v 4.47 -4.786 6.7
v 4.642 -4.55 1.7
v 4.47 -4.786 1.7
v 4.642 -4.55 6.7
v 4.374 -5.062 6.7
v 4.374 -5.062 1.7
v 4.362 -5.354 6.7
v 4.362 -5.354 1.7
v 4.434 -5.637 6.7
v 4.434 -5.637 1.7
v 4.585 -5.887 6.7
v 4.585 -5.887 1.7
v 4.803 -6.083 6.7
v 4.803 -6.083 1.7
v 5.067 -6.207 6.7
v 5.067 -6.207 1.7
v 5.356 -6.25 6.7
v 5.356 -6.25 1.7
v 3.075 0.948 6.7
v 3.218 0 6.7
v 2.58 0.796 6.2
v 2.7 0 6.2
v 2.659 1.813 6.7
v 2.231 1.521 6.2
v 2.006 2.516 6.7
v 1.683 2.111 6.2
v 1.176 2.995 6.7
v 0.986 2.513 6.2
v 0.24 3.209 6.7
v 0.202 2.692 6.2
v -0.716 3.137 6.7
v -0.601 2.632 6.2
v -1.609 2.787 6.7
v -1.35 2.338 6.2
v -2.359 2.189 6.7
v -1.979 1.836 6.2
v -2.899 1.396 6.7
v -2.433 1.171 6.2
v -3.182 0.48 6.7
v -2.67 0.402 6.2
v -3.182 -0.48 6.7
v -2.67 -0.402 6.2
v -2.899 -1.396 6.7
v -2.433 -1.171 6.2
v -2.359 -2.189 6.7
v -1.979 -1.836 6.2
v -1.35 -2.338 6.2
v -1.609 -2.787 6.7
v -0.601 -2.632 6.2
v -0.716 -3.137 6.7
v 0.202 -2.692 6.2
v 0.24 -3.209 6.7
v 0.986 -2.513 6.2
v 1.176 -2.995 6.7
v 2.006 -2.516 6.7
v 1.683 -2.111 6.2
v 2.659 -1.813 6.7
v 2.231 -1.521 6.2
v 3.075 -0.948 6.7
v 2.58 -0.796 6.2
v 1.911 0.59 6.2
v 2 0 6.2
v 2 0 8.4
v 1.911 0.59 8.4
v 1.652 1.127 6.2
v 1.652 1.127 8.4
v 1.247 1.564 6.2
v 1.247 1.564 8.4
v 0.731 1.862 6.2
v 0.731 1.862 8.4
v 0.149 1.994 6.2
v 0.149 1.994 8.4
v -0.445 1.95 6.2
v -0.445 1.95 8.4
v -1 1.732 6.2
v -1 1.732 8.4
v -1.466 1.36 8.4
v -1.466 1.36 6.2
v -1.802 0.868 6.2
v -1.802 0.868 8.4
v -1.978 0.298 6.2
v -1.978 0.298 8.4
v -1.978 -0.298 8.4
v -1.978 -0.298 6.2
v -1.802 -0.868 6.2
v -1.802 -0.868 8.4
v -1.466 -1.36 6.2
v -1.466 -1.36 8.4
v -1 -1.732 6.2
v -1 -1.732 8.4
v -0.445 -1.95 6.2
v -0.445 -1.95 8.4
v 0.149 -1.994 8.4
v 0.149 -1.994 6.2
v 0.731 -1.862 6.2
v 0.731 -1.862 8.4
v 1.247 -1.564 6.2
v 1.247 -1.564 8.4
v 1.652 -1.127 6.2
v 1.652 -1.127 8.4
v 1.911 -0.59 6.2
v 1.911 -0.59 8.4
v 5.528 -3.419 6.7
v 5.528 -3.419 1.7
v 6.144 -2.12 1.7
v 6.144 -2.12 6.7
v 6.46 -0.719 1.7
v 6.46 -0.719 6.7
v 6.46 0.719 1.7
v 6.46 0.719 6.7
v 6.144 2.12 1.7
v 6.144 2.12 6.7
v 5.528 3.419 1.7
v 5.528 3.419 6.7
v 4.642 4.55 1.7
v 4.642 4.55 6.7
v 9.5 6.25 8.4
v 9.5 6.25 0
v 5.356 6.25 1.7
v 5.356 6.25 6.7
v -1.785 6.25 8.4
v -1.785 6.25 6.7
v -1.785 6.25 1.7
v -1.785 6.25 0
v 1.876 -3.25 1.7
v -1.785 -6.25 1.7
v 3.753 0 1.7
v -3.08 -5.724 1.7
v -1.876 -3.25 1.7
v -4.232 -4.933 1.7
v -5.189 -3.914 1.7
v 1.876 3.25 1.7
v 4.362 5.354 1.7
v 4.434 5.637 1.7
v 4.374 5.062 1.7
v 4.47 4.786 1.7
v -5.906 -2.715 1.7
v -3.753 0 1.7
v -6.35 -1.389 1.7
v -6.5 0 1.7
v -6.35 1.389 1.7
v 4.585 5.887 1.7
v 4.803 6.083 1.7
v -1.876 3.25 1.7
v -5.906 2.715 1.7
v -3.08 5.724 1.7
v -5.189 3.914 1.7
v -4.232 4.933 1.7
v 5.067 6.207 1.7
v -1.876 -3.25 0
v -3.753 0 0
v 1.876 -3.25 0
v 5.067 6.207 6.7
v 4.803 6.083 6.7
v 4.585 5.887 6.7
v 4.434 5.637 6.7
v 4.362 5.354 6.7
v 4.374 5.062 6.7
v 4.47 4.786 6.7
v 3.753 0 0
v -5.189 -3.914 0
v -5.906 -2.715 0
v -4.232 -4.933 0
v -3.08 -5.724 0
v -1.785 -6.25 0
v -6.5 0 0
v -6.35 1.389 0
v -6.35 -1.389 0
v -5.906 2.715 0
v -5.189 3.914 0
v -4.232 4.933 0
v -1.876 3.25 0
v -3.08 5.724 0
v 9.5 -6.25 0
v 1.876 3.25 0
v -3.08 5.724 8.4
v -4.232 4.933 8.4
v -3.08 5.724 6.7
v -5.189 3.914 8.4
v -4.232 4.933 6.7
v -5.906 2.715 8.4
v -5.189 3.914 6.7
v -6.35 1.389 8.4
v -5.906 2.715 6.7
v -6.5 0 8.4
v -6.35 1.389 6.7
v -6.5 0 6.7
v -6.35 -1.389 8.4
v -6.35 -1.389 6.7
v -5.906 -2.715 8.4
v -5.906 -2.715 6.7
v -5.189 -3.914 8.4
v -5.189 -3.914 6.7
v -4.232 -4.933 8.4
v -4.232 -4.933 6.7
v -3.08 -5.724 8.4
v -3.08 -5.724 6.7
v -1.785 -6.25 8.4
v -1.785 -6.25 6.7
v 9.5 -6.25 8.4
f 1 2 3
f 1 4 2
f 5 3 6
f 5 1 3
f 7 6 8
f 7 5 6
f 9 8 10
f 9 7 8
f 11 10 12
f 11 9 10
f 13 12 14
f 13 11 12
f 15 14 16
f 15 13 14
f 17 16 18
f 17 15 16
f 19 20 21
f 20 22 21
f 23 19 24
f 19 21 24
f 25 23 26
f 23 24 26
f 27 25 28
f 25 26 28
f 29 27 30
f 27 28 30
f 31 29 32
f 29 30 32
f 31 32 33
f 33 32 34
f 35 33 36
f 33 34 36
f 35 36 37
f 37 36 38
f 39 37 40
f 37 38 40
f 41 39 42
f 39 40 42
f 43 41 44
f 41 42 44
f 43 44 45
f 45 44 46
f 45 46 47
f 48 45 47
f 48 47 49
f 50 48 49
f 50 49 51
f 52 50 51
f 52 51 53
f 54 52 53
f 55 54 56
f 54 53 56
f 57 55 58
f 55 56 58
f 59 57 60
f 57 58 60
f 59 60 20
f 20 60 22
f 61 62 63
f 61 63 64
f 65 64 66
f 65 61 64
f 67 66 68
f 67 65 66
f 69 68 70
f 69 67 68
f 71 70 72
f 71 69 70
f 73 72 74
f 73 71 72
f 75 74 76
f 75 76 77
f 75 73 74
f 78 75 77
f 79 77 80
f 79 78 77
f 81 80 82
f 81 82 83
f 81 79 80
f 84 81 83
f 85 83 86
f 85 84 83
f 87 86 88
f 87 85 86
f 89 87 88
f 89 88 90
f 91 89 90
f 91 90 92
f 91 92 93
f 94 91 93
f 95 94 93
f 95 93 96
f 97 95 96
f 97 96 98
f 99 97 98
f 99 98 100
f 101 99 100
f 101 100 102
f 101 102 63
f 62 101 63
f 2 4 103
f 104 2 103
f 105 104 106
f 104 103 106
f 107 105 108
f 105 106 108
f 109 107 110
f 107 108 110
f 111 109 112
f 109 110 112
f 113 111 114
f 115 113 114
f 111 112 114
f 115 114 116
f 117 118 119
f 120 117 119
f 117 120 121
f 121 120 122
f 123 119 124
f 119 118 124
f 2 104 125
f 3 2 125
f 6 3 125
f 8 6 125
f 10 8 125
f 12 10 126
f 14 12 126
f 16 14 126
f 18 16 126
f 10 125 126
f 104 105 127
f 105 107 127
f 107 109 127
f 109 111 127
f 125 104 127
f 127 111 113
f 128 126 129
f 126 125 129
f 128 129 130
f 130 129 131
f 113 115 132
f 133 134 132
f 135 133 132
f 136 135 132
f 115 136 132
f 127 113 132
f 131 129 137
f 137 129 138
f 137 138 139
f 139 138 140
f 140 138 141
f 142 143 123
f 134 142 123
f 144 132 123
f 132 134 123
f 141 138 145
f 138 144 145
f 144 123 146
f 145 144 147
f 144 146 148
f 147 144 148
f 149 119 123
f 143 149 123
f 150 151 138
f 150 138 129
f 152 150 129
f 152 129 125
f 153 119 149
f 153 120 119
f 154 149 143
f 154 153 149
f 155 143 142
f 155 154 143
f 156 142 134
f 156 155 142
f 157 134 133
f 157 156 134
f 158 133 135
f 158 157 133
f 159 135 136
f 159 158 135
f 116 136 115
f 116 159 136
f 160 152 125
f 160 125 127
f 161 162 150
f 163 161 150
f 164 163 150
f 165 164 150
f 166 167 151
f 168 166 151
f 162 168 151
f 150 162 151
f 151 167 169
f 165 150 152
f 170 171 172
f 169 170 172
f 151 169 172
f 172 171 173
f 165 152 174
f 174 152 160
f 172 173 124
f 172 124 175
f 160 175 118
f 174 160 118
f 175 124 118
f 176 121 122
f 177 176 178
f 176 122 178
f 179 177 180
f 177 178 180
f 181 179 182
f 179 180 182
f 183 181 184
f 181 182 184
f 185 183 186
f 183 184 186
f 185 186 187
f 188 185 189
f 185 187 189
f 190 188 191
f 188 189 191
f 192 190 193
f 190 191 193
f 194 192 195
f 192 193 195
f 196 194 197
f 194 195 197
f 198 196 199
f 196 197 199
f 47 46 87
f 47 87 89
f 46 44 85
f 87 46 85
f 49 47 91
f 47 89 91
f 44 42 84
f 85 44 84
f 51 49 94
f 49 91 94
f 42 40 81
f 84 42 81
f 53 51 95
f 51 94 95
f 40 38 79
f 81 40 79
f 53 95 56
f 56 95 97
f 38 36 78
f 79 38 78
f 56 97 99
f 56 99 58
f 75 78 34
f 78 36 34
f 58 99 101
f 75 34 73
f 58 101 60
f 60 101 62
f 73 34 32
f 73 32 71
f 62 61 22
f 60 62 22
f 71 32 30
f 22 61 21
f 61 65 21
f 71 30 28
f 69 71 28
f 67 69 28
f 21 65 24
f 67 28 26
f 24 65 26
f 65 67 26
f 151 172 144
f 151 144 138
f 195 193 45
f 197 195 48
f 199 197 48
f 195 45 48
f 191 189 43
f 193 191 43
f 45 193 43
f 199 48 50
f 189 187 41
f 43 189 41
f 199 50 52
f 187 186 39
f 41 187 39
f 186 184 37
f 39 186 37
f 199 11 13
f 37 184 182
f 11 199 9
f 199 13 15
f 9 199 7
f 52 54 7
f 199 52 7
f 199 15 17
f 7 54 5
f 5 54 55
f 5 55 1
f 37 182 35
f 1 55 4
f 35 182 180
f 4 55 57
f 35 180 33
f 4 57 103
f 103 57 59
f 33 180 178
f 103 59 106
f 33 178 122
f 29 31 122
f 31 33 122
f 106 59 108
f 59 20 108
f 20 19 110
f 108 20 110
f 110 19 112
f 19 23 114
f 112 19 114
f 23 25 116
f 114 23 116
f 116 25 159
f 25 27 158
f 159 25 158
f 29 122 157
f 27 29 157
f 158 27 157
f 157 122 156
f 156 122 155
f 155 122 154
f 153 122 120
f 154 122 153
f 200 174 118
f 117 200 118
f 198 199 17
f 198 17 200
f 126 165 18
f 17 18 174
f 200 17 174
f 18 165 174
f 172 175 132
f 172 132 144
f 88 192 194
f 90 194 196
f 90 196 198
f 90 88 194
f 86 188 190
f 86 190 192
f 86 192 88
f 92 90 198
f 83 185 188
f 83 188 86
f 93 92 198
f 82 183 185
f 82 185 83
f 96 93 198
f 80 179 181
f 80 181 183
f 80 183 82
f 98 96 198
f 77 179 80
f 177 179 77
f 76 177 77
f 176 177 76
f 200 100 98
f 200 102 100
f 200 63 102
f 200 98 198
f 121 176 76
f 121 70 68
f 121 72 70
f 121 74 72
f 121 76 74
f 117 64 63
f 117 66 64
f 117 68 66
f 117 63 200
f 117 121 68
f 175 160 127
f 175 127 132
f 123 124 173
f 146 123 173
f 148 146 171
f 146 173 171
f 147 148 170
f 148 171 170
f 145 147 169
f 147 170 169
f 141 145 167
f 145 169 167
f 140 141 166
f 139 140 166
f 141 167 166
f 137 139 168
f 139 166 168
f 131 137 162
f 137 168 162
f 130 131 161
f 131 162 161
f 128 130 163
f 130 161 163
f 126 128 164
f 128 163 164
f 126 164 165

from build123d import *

# Parameters (mm, degrees)
F1_R     = 2
F3_DEPTH = 8.4
F5_R     = 2
F6_DEPTH = 25
F7_DEPTH = 1.7
F8_R     = 1


with BuildPart() as f3:
    # F1 (on Top) → F3 (new body, through all)
    with BuildSketch(Plane.XY):
        with BuildLine():
            Line((9.5, 6.25), (1.7853571071, 6.25))
            ThreePointArc((1.7853571071, 6.25), (5.1891628032, 3.9144079248), (6.5, 0))
            ThreePointArc((6.5, 0), (5.1891628032, -3.9144079248), (1.7853571071, -6.25))
            Line((1.7853571071, -6.25), (9.5, -6.25))
            Line((9.5, -6.25), (9.5, 6.25))
        make_face()
        with BuildLine():
            Line((1.7853571071, 6.25), (-1.7853571071, 6.25))
            ThreePointArc((-1.7853571071, 6.25), (-6.5, 0), (-1.7853571071, -6.25))
            Line((-1.7853571071, -6.25), (1.7853571071, -6.25))
            ThreePointArc((1.7853571071, -6.25), (5.1891628032, -3.9144079248), (6.5, 0))
            ThreePointArc((6.5, 0), (5.1891628032, 3.9144079248), (1.7853571071, 6.25))
        make_face()
        Polygon((-3.7527767497, 0), (-1.8763883749, 3.25), (1.8763883749, 3.25), (3.7527767497, 0), (1.8763883749, -3.25), (-1.8763883749, -3.25), align=None, mode=Mode.SUBTRACT)
        Polygon((1.8763883749, 3.25), (-1.8763883749, 3.25), (-3.7527767497, 0), (-1.8763883749, -3.25), (1.8763883749, -3.25), (3.7527767497, 0), align=None)
        Circle(F1_R, mode=Mode.SUBTRACT)
    extrude(amount=F3_DEPTH)

    # F2 (on Front) → F4 (revolve, cut)
    with BuildSketch(Plane.XZ):
        Polygon((0, 6.2), (0, 1.7), (6.5, 1.7), (6.5, 6.7), (3.2177651569, 6.7), (2.7, 6.2), align=None)
    revolve(axis=Axis((0, 0, 4.2), (0, 0, 1)), mode=Mode.SUBTRACT)

    # F5 (on face) → F6 (cut)
    with BuildSketch(Plane.XY.offset(8.4)):
        Circle(F5_R)
    extrude(amount=-F6_DEPTH, mode=Mode.SUBTRACT)

    # F1 (on Top) → F7 (cut, through all)
    with BuildSketch(Plane.XY):
        Polygon((1.8763883749, 3.25), (-1.8763883749, 3.25), (-3.7527767497, 0), (-1.8763883749, -3.25), (1.8763883749, -3.25), (3.7527767497, 0), align=None)
        Circle(F1_R, mode=Mode.SUBTRACT)
    extrude(amount=F7_DEPTH, mode=Mode.SUBTRACT)

    # F8
    f8_edges = [f3.edges().sort_by_distance(p)[0] for p in [
        (1.785357, 6.25, 4.2),
        (1.785357, -6.25, 4.2),
    ]]
    fillet(f8_edges, radius=F8_R)


solid = f3.part
